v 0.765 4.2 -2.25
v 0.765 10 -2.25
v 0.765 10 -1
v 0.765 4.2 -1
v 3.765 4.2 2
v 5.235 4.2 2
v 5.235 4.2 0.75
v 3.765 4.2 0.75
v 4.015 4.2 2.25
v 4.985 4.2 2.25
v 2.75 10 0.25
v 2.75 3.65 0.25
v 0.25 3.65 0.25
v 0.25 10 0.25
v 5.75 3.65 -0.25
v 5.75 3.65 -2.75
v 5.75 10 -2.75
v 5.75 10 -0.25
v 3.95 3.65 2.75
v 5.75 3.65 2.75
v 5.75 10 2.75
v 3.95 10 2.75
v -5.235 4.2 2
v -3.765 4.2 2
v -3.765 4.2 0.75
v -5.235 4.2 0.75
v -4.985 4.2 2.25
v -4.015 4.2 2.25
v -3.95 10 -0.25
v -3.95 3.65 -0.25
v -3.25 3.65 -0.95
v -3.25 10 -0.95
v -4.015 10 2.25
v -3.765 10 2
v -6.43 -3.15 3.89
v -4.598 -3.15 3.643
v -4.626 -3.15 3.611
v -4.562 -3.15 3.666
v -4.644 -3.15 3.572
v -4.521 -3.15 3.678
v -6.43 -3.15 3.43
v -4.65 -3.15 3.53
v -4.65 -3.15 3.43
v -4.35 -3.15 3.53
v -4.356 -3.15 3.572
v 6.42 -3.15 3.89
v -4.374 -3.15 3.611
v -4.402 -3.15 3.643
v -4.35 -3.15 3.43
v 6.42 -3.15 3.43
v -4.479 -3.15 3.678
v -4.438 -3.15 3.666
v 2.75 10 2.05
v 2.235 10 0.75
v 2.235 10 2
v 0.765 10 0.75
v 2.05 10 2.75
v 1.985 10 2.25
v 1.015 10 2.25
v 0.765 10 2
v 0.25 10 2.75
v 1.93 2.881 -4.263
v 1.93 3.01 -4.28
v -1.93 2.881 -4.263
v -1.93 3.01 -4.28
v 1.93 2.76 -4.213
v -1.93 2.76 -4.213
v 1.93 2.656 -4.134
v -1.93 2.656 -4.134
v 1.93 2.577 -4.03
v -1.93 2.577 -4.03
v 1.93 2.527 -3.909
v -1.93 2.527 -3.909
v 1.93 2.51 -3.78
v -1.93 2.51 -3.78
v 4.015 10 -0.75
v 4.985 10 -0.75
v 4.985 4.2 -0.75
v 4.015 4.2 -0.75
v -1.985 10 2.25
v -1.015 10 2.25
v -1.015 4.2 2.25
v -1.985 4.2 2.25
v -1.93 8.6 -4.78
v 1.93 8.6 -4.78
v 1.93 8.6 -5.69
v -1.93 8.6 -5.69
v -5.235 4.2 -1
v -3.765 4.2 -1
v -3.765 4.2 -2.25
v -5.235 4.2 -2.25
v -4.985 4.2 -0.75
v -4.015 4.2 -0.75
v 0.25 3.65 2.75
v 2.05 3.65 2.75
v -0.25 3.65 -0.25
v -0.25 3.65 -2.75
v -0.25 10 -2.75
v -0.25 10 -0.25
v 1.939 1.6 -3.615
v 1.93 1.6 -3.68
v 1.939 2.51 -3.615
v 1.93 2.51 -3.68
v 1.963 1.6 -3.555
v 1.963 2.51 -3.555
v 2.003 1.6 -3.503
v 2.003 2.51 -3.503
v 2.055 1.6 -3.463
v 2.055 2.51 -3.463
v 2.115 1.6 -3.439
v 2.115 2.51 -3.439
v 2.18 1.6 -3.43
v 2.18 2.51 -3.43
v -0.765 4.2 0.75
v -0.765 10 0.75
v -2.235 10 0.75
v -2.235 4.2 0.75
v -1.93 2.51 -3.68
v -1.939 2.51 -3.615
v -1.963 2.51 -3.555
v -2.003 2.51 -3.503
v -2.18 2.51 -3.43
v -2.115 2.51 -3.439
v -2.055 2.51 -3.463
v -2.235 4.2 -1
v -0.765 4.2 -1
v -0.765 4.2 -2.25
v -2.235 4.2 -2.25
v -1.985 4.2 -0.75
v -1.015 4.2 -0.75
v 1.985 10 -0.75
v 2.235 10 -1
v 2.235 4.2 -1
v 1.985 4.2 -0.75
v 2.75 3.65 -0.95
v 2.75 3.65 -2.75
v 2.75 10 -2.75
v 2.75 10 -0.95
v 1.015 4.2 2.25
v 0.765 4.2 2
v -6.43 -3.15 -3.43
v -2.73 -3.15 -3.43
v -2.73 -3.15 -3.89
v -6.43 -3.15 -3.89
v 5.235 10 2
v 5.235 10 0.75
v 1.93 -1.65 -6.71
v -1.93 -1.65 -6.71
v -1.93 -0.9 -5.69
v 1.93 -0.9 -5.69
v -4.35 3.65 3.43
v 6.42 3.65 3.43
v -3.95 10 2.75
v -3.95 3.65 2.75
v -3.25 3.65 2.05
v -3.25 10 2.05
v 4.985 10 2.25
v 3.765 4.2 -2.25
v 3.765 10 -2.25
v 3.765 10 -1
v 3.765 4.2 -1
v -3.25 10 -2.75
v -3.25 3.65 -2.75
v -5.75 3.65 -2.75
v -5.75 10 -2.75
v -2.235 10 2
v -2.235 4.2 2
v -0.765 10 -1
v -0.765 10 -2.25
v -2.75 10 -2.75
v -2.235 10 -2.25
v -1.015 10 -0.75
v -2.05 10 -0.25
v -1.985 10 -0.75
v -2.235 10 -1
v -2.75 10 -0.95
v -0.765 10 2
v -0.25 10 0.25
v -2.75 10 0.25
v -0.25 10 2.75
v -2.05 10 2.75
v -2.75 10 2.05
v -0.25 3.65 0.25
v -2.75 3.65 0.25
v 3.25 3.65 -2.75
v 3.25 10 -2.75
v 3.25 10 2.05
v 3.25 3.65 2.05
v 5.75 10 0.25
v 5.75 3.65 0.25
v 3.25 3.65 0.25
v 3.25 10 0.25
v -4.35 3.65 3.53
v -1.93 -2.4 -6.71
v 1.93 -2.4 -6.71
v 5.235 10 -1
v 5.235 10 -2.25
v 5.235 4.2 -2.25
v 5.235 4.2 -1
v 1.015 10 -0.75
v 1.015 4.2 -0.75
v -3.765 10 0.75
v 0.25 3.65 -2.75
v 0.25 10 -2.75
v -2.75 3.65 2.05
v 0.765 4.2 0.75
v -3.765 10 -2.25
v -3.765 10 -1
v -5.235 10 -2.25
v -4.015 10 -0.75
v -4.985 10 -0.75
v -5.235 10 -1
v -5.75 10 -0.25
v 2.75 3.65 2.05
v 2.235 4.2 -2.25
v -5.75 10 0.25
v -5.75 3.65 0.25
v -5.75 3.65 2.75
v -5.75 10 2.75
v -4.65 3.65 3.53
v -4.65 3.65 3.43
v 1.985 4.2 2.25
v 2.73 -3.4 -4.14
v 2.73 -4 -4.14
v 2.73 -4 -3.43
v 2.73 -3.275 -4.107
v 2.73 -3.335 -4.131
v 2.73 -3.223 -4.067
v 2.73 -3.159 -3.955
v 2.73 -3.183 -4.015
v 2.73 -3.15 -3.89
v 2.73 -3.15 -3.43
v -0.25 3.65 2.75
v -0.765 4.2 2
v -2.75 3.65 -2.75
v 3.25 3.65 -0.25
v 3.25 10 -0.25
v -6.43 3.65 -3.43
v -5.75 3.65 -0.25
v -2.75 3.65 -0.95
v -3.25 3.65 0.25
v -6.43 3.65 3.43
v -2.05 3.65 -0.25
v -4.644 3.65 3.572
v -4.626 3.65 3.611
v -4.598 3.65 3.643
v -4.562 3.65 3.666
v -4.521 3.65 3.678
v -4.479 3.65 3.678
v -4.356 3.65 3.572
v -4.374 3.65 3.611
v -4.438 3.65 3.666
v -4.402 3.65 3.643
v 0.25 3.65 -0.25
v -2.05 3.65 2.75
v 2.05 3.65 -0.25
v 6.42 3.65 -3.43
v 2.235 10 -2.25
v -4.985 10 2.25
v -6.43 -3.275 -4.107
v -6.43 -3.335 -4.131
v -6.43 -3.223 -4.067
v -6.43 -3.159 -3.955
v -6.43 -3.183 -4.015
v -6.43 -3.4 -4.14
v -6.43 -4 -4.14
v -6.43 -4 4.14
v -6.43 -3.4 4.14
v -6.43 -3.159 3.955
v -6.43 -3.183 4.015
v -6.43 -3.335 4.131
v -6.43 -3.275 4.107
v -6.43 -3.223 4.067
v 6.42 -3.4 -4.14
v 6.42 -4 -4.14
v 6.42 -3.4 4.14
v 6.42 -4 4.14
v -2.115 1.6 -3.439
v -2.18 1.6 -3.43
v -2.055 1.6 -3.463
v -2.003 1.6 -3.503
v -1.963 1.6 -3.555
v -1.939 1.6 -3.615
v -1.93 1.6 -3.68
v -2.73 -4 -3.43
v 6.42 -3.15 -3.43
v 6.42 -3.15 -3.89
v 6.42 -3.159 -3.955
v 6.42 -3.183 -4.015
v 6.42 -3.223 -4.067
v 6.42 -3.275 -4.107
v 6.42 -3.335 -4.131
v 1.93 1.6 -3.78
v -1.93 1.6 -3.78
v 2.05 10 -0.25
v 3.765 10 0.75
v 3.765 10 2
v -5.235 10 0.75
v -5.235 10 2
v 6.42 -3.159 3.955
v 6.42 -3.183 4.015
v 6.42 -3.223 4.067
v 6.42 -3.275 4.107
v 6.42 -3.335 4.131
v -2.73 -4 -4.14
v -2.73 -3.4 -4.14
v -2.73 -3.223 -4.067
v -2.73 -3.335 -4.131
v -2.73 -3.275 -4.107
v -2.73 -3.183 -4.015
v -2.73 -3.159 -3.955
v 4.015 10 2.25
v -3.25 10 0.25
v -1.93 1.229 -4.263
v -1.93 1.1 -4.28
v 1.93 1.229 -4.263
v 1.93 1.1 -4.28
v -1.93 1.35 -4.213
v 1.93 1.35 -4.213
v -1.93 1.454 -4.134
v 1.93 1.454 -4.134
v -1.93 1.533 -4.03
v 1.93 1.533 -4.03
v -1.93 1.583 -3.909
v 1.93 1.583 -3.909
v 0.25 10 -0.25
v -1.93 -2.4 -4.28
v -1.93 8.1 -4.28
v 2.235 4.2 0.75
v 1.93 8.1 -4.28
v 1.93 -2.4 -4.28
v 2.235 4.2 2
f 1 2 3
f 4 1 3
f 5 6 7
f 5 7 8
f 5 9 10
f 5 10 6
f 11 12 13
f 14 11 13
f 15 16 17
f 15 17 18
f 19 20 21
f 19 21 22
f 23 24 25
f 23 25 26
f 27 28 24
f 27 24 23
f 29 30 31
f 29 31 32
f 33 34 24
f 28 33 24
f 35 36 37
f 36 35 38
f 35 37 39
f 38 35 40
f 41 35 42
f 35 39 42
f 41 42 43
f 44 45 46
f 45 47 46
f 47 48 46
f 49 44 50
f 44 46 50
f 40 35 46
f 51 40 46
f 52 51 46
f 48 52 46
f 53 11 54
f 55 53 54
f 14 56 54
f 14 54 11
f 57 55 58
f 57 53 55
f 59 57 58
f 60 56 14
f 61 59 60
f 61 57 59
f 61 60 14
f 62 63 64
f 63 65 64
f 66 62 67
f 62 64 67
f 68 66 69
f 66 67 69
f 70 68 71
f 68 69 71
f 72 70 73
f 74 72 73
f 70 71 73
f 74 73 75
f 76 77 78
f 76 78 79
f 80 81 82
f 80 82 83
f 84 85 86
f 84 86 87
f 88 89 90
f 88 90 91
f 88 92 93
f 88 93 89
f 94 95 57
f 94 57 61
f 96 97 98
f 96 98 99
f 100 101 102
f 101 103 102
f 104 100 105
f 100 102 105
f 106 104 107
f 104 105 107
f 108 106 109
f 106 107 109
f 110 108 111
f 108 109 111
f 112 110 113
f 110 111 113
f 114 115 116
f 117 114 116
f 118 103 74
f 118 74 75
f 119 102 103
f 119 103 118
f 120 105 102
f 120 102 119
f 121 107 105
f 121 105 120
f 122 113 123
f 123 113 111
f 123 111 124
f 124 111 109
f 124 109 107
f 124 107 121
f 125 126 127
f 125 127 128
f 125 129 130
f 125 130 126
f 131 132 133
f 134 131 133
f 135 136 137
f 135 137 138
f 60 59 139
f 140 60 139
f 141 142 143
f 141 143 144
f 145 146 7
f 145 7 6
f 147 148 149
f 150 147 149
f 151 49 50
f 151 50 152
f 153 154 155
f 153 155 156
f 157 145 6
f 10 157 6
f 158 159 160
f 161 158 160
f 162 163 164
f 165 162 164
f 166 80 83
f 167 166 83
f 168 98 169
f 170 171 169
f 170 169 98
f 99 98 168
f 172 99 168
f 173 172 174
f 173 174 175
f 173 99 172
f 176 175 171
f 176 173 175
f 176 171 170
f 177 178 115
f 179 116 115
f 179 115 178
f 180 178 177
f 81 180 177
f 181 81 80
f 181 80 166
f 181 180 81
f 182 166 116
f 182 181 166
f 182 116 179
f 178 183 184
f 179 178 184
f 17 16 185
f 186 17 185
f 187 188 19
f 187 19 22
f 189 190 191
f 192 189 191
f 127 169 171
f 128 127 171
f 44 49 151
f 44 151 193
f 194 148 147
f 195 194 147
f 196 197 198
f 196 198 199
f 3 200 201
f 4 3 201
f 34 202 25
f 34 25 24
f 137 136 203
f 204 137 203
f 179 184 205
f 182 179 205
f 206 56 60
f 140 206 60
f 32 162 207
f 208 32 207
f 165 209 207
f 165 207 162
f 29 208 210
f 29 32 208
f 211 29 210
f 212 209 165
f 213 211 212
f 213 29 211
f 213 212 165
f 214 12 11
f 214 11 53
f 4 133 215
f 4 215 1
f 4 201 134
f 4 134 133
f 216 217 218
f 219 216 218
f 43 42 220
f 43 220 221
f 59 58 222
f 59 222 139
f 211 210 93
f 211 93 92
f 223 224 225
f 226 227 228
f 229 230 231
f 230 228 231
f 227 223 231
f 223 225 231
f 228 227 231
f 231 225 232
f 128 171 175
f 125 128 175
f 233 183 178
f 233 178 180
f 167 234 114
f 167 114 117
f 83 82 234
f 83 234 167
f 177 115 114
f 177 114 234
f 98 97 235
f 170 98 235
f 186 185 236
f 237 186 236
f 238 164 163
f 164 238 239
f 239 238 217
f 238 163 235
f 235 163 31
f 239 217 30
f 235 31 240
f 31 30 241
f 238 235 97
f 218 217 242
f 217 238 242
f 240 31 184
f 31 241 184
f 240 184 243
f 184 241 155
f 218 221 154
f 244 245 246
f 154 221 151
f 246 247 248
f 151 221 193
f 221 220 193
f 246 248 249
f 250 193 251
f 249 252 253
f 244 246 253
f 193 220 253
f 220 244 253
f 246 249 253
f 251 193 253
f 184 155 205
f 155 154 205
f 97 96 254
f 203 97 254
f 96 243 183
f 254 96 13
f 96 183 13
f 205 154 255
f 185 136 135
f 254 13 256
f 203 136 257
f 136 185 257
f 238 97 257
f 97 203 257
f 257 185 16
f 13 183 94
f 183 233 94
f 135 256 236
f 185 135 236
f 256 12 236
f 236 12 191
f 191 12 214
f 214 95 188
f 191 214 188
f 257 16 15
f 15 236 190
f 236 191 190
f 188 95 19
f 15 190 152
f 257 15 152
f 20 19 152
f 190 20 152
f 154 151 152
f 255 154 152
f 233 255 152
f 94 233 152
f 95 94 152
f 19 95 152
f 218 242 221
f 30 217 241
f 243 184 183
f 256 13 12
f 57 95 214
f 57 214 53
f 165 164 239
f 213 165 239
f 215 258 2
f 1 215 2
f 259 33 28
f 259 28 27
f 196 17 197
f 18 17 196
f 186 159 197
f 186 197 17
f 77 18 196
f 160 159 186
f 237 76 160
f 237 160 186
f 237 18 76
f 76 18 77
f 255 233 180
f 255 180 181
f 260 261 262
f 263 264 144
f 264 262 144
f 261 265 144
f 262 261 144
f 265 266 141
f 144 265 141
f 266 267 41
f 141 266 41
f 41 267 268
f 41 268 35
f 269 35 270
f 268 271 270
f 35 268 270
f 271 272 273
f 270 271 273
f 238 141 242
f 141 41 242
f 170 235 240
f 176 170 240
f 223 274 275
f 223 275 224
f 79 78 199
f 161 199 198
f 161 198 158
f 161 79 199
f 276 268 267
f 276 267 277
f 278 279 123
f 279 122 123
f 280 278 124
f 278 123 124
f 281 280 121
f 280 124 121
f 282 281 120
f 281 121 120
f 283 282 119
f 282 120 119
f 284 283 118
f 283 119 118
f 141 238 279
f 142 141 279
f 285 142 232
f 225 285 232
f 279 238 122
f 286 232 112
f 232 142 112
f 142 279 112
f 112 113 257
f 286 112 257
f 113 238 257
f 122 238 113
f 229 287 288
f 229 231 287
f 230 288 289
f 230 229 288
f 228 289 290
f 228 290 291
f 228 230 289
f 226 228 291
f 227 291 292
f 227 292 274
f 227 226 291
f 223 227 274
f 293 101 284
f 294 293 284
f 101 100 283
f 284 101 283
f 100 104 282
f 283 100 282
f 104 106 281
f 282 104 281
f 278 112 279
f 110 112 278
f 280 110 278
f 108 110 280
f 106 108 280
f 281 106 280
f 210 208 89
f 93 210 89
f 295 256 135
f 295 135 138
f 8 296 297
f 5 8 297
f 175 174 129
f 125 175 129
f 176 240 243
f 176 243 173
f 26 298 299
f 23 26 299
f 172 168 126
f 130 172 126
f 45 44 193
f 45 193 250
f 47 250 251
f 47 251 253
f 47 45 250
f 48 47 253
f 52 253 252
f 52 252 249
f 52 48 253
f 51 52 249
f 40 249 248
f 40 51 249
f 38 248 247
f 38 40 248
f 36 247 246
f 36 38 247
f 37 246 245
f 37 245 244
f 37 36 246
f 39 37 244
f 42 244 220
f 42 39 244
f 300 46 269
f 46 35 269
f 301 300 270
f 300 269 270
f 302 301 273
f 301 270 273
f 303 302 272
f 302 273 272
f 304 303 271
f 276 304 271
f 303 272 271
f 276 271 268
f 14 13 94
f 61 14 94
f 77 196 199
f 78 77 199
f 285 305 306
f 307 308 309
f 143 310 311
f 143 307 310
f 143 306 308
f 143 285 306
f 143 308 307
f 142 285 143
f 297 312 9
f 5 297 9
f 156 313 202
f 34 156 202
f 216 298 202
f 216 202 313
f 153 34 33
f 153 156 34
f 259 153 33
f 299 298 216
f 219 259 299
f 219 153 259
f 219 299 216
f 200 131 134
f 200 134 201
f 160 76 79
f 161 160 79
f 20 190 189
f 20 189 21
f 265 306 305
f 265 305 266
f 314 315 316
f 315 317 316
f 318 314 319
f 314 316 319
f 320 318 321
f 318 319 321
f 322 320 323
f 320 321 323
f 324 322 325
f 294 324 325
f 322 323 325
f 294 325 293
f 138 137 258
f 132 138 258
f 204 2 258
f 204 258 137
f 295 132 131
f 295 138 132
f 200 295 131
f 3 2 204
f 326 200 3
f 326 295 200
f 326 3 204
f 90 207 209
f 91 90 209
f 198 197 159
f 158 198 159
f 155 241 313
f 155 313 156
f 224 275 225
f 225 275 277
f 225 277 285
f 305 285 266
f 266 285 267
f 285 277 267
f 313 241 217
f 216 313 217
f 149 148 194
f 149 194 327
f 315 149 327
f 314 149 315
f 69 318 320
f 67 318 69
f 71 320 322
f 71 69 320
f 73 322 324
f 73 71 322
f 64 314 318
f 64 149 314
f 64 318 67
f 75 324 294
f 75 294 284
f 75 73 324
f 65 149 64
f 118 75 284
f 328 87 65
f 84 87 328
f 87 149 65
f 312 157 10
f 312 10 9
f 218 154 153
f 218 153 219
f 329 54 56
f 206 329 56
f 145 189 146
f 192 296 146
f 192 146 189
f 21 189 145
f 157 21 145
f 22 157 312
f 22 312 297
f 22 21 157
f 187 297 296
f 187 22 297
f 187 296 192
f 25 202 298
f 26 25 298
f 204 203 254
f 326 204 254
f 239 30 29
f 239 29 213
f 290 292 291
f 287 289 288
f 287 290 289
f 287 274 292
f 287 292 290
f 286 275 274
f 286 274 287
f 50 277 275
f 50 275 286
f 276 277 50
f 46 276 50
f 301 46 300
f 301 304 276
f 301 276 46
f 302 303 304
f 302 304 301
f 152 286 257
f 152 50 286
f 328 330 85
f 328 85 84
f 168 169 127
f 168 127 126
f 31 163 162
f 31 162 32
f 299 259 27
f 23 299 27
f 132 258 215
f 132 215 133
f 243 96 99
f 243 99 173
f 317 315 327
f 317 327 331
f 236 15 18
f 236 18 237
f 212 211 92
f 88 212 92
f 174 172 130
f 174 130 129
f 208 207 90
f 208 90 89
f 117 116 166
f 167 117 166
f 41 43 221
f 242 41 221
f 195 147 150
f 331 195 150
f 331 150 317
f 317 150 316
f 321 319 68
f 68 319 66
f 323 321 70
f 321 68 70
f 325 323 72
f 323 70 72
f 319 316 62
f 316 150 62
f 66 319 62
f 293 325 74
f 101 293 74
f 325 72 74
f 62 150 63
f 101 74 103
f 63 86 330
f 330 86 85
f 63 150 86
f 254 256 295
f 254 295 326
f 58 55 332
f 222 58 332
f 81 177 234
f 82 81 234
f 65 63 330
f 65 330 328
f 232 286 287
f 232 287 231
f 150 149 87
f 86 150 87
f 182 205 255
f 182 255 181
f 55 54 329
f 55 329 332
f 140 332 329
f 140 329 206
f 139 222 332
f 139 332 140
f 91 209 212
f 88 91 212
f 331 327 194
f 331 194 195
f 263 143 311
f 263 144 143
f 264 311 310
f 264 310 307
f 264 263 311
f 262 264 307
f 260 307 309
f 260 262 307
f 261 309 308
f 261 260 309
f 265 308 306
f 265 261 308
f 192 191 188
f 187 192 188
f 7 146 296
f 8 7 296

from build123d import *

# Parameters (mm, degrees)
SKETCH1_W            = 12.85
SKETCH1_H            = 7.65
BOSS_EXTRUDE1_DEPTH  = 7.57
SKETCH2_W            = 3.86
SKETCH2_H            = 0.91
BOSS_EXTRUDE2_DEPTH  = 3.28
SKETCH3_W            = 3.86
SKETCH3_H            = 2.43
BOSS_EXTRUDE3_DEPTH  = 6.09
SKETCH4_W            = 3.86
SKETCH4_H            = 2.43
BOSS_EXTRUDE4_DEPTH  = 4
SKETCH5_W            = 1.02
SKETCH5_H            = 9.5
CUT_EXTRUDE1_DEPTH   = 9.35
SKETCH6_W            = 0.71
SKETCH6_H            = 6.8
CUT_EXTRUDE2_DEPTH   = 13.85
BOSS_EXTRUDE5_DEPTH  = 6.8
SKETCH8_W            = 3.69
SKETCH8_H            = 0.85
BOSS_EXTRUDE6_DEPTH  = 0.71
SKETCH9_W            = 3.7
SKETCH9_H            = 0.85
BOSS_EXTRUDE7_DEPTH  = 0.71
SKETCH10_W           = 2.5
SKETCH10_H           = 2.5
BOSS_EXTRUDE8_DEPTH  = 6.35
SKETCH11_W           = 1.47
SKETCH11_H           = 1.5
CUT_EXTRUDE3_DEPTH   = 5.8
SKETCH12_W           = 2.5
SKETCH12_H           = 2.5
BOSS_EXTRUDE9_DEPTH  = 6.35
SKETCH13_W           = 1.47
SKETCH13_H           = 1.5
CUT_EXTRUDE4_DEPTH   = 5.8
SKETCH14_W           = 2.5
SKETCH14_H           = 2.5
BOSS_EXTRUDE10_DEPTH = 6.35
SKETCH15_W           = 1.47
SKETCH15_H           = 1.5
CUT_EXTRUDE5_DEPTH   = 5.8
SKETCH16_W           = 2.5
SKETCH16_H           = 2.5
BOSS_EXTRUDE11_DEPTH = 6.35
SKETCH17_W           = 1.47
SKETCH17_H           = 1.5
CUT_EXTRUDE6_DEPTH   = 5.8
SKETCH18_W           = 2.5
SKETCH18_H           = 2.5
BOSS_EXTRUDE12_DEPTH = 6.35
SKETCH19_W           = 1.47
SKETCH19_H           = 1.5
CUT_EXTRUDE7_DEPTH   = 5.8
SKETCH20_W           = 2.5
SKETCH20_H           = 2.5
BOSS_EXTRUDE13_DEPTH = 6.35
SKETCH21_W           = 1.47
SKETCH21_H           = 1.5
CUT_EXTRUDE8_DEPTH   = 5.8
SKETCH22_W           = 2.5
SKETCH22_H           = 2.5
BOSS_EXTRUDE14_DEPTH = 6.35
SKETCH23_W           = 1.47
SKETCH23_H           = 1.5
CUT_EXTRUDE9_DEPTH   = 5.8
SKETCH24_W           = 2.5
SKETCH24_H           = 2.5
BOSS_EXTRUDE15_DEPTH = 6.35
SKETCH25_W           = 1.47
SKETCH25_H           = 1.5
CUT_EXTRUDE10_DEPTH  = 5.8
DRAFT1_ANGLE         = 36.326825952
CHAMFER1_SIZE        = 0.25
CHAMFER2_SIZE        = 0.7
CHAMFER3_SIZE        = 0.5
FILLET1_R            = 0.25
FILLET2_R            = 0.5


with BuildPart() as part:
    # Sketch1 → Boss-Extrude1 (new body)
    with BuildSketch(Plane.XY.offset(4.14)):
        with Locations((-0.005, -0.175)):
            Rectangle(SKETCH1_W, SKETCH1_H)
    extrude(amount=-BOSS_EXTRUDE1_DEPTH)

    # Sketch2 → Boss-Extrude2 (add)
    with BuildSketch(Plane(origin=(0, 0, -3.43), x_dir=(-1, 0, 0), z_dir=(0, 0, -1))):
        with Locations((0, 2.055)):
            Rectangle(SKETCH2_W, SKETCH2_H)
    extrude(amount=BOSS_EXTRUDE2_DEPTH)

    # Sketch3 → Boss-Extrude3 (add)
    with BuildSketch(Plane(origin=(0, 2.51, 0), x_dir=(-1, 0, 0), z_dir=(0, 1, 0))):
        with Locations((0, -5.495)):
            Rectangle(SKETCH3_W, SKETCH3_H)
    extrude(amount=BOSS_EXTRUDE3_DEPTH)

    # Sketch4 → Boss-Extrude4 (add)
    with BuildSketch(Plane.XZ.offset(-1.6)):
        with Locations((0, -5.495)):
            Rectangle(SKETCH4_W, SKETCH4_H)
    extrude(amount=BOSS_EXTRUDE4_DEPTH)

    # Sketch5 → Cut-Extrude1 (cut, through all)
    with BuildSketch(Plane.ZY.offset(1.93)):
        with Locations((-6.2, 3.85)):
            Rectangle(SKETCH5_W, SKETCH5_H)
    extrude(amount=-CUT_EXTRUDE1_DEPTH, mode=Mode.SUBTRACT)

    # Sketch6 → Cut-Extrude2 (cut, through all)
    with BuildSketch(Plane(origin=(6.42, 0, 0), x_dir=(0, 0, -1), z_dir=(1, 0, 0))):
        with Locations((-3.785, 0.25)):
            Rectangle(SKETCH6_W, SKETCH6_H)
    extrude(amount=-CUT_EXTRUDE2_DEPTH, mode=Mode.SUBTRACT)

    # Sketch7 → Boss-Extrude5 (add)
    with BuildSketch(Plane(origin=(0, -3.15, 0), x_dir=(-1, 0, 0), z_dir=(0, 1, 0))):
        with BuildLine():
            Line((4.35, 3.43), (4.35, 3.53))
            ThreePointArc((4.35, 3.53), (4.5, 3.68), (4.65, 3.53))
            Line((4.65, 3.53), (4.65, 3.43))
            Line((4.65, 3.43), (4.35, 3.43))
        make_face()
    extrude(amount=BOSS_EXTRUDE5_DEPTH)

    # Sketch8 → Boss-Extrude6 (add)
    with BuildSketch(Plane(origin=(0, 0, -3.43), x_dir=(-1, 0, 0), z_dir=(0, 0, -1))):
        with Locations((-4.575, -3.575)):
            Rectangle(SKETCH8_W, SKETCH8_H)
    extrude(amount=BOSS_EXTRUDE6_DEPTH)

    # Sketch9 → Boss-Extrude7 (add)
    with BuildSketch(Plane(origin=(0, 0, -3.43), x_dir=(-1, 0, 0), z_dir=(0, 0, -1))):
        with Locations((4.58, -3.575)):
            Rectangle(SKETCH9_W, SKETCH9_H)
    extrude(amount=BOSS_EXTRUDE7_DEPTH)

    # Sketch10 → Boss-Extrude8 (add)
    with BuildSketch(Plane(origin=(0, 3.65, 0), x_dir=(-1, 0, 0), z_dir=(0, 1, 0))):
        with Locations((4.5, -1.5)):
            Rectangle(SKETCH10_W, SKETCH10_H)
    extrude(amount=BOSS_EXTRUDE8_DEPTH)

    # Sketch11 → Cut-Extrude3 (cut)
    with BuildSketch(Plane(origin=(0, 10, 0), x_dir=(-1, 0, 0), z_dir=(0, 1, 0))):
        with Locations((4.5, -1.5)):
            Rectangle(SKETCH11_W, SKETCH11_H)
    extrude(amount=-CUT_EXTRUDE3_DEPTH, mode=Mode.SUBTRACT)

    # Sketch12 → Boss-Extrude9 (add)
    with BuildSketch(Plane(origin=(0, 3.65, 0), x_dir=(-1, 0, 0), z_dir=(0, 1, 0))):
        with Locations((4.5, 1.5)):
            Rectangle(SKETCH12_W, SKETCH12_H)
    extrude(amount=BOSS_EXTRUDE9_DEPTH)

    # Sketch13 → Cut-Extrude4 (cut)
    with BuildSketch(Plane(origin=(0, 10, 0), x_dir=(-1, 0, 0), z_dir=(0, 1, 0))):
        with Locations((4.5, 1.5)):
            Rectangle(SKETCH13_W, SKETCH13_H)
    extrude(amount=-CUT_EXTRUDE4_DEPTH, mode=Mode.SUBTRACT)

    # Sketch14 → Boss-Extrude10 (add)
    with BuildSketch(Plane(origin=(0, 3.65, 0), x_dir=(-1, 0, 0), z_dir=(0, 1, 0))):
        with Locations((1.5, 1.5)):
            Rectangle(SKETCH14_W, SKETCH14_H)
    extrude(amount=BOSS_EXTRUDE10_DEPTH)

    # Sketch15 → Cut-Extrude5 (cut)
    with BuildSketch(Plane(origin=(0, 10, 0), x_dir=(-1, 0, 0), z_dir=(0, 1, 0))):
        with Locations((1.5, 1.5)):
            Rectangle(SKETCH15_W, SKETCH15_H)
    extrude(amount=-CUT_EXTRUDE5_DEPTH, mode=Mode.SUBTRACT)

    # Sketch16 → Boss-Extrude11 (add)
    with BuildSketch(Plane(origin=(0, 3.65, 0), x_dir=(-1, 0, 0), z_dir=(0, 1, 0))):
        with Locations((1.5, -1.5)):
            Rectangle(SKETCH16_W, SKETCH16_H)
    extrude(amount=BOSS_EXTRUDE11_DEPTH)

    # Sketch17 → Cut-Extrude6 (cut)
    with BuildSketch(Plane(origin=(0, 10, 0), x_dir=(-1, 0, 0), z_dir=(0, 1, 0))):
        with Locations((1.5, -1.5)):
            Rectangle(SKETCH17_W, SKETCH17_H)
    extrude(amount=-CUT_EXTRUDE6_DEPTH, mode=Mode.SUBTRACT)

    # Sketch18 → Boss-Extrude12 (add)
    with BuildSketch(Plane(origin=(0, 3.65, 0), x_dir=(-1, 0, 0), z_dir=(0, 1, 0))):
        with Locations((-1.5, -1.5)):
            Rectangle(SKETCH18_W, SKETCH18_H)
    extrude(amount=BOSS_EXTRUDE12_DEPTH)

    # Sketch19 → Cut-Extrude7 (cut)
    with BuildSketch(Plane(origin=(0, 10, 0), x_dir=(-1, 0, 0), z_dir=(0, 1, 0))):
        with Locations((-1.5, -1.5)):
            Rectangle(SKETCH19_W, SKETCH19_H)
    extrude(amount=-CUT_EXTRUDE7_DEPTH, mode=Mode.SUBTRACT)

    # Sketch20 → Boss-Extrude13 (add)
    with BuildSketch(Plane(origin=(0, 3.65, 0), x_dir=(-1, 0, 0), z_dir=(0, 1, 0))):
        with Locations((-1.5, 1.5)):
            Rectangle(SKETCH20_W, SKETCH20_H)
    extrude(amount=BOSS_EXTRUDE13_DEPTH)

    # Sketch21 → Cut-Extrude8 (cut)
    with BuildSketch(Plane(origin=(0, 10, 0), x_dir=(-1, 0, 0), z_dir=(0, 1, 0))):
        with Locations((-1.5, 1.5)):
            Rectangle(SKETCH21_W, SKETCH21_H)
    extrude(amount=-CUT_EXTRUDE8_DEPTH, mode=Mode.SUBTRACT)

    # Sketch22 → Boss-Extrude14 (add)
    with BuildSketch(Plane(origin=(0, 3.65, 0), x_dir=(-1, 0, 0), z_dir=(0, 1, 0))):
        with Locations((-4.5, 1.5)):
            Rectangle(SKETCH22_W, SKETCH22_H)
    extrude(amount=BOSS_EXTRUDE14_DEPTH)

    # Sketch23 → Cut-Extrude9 (cut)
    with BuildSketch(Plane(origin=(0, 10, 0), x_dir=(-1, 0, 0), z_dir=(0, 1, 0))):
        with Locations((-4.5, 1.5)):
            Rectangle(SKETCH23_W, SKETCH23_H)
    extrude(amount=-CUT_EXTRUDE9_DEPTH, mode=Mode.SUBTRACT)

    # Sketch24 → Boss-Extrude15 (add)
    with BuildSketch(Plane(origin=(0, 3.65, 0), x_dir=(-1, 0, 0), z_dir=(0, 1, 0))):
        with Locations((-4.5, -1.5)):
            Rectangle(SKETCH24_W, SKETCH24_H)
    extrude(amount=BOSS_EXTRUDE15_DEPTH)

    # Sketch25 → Cut-Extrude10 (cut)
    with BuildSketch(Plane(origin=(0, 10, 0), x_dir=(-1, 0, 0), z_dir=(0, 1, 0))):
        with Locations((-4.5, -1.5)):
            Rectangle(SKETCH25_W, SKETCH25_H)
    extrude(amount=-CUT_EXTRUDE10_DEPTH, mode=Mode.SUBTRACT)

    # Draft1
    draft1_faces = [part.faces().sort_by_distance(p)[0] for p in [
        (0, -0.9, -6.2),
    ]]
    draft(draft1_faces, Plane(origin=(6.42, -0.9, -5.69), x_dir=(-1, 0, 0), z_dir=(0, 0, -1)), DRAFT1_ANGLE)

    # Chamfer1
    chamfer1_edges = [part.edges().sort_by_distance(p)[0] for p in [
        (-3.765, 7.1, -0.75),
        (-5.235, 7.1, -0.75),
        (-3.765, 7.1, 2.25),
        (-5.235, 7.1, 2.25),
        (-0.765, 7.1, 2.25),
        (-2.235, 7.1, 2.25),
        (-0.765, 7.1, -0.75),
        (-2.235, 7.1, -0.75),
        (2.235, 7.1, -0.75),
        (0.765, 7.1, -0.75),
        (2.235, 7.1, 2.25),
        (0.765, 7.1, 2.25),
        (5.235, 7.1, 2.25),
        (3.765, 7.1, 2.25),
        (5.235, 7.1, -0.75),
        (3.765, 7.1, -0.75),
    ]]
    chamfer(chamfer1_edges, length=CHAMFER1_SIZE)

    # Chamfer2
    chamfer2_edges = [part.edges().sort_by_distance(p)[0] for p in [
        (-3.25, 6.825, -0.25),
        (-3.25, 6.825, 2.75),
        (-2.75, 6.825, 2.75),
        (-2.75, 6.825, -0.25),
        (2.75, 6.825, -0.25),
        (2.75, 6.825, 2.75),
        (3.25, 6.825, 2.75),
    ]]
    chamfer(chamfer2_edges, length=CHAMFER2_SIZE)

    # Chamfer3
    chamfer3_edges = [part.edges().sort_by_distance(p)[0] for p in [
        (0, 8.6, -4.28),
    ]]
    chamfer(chamfer3_edges, length=CHAMFER3_SIZE)

    # Fillet1
    fillet1_edges = [part.edges().sort_by_distance(p)[0] for p in [
        (4.575, -3.15, -4.14),
        (-4.58, -3.15, -4.14),
        (-1.93, 2.055, -3.43),
        (1.93, 2.055, -3.43),
        (-0.005, -3.15, 4.14),
    ]]
    fillet(fillet1_edges, radius=FILLET1_R)

    # Fillet2
    fillet2_edges = [part.edges().sort_by_distance(p)[0] for p in [
        (0, 2.51, -4.28),
        (0, 1.6, -4.28),
    ]]
    fillet(fillet2_edges, radius=FILLET2_R)


solid = part.part
